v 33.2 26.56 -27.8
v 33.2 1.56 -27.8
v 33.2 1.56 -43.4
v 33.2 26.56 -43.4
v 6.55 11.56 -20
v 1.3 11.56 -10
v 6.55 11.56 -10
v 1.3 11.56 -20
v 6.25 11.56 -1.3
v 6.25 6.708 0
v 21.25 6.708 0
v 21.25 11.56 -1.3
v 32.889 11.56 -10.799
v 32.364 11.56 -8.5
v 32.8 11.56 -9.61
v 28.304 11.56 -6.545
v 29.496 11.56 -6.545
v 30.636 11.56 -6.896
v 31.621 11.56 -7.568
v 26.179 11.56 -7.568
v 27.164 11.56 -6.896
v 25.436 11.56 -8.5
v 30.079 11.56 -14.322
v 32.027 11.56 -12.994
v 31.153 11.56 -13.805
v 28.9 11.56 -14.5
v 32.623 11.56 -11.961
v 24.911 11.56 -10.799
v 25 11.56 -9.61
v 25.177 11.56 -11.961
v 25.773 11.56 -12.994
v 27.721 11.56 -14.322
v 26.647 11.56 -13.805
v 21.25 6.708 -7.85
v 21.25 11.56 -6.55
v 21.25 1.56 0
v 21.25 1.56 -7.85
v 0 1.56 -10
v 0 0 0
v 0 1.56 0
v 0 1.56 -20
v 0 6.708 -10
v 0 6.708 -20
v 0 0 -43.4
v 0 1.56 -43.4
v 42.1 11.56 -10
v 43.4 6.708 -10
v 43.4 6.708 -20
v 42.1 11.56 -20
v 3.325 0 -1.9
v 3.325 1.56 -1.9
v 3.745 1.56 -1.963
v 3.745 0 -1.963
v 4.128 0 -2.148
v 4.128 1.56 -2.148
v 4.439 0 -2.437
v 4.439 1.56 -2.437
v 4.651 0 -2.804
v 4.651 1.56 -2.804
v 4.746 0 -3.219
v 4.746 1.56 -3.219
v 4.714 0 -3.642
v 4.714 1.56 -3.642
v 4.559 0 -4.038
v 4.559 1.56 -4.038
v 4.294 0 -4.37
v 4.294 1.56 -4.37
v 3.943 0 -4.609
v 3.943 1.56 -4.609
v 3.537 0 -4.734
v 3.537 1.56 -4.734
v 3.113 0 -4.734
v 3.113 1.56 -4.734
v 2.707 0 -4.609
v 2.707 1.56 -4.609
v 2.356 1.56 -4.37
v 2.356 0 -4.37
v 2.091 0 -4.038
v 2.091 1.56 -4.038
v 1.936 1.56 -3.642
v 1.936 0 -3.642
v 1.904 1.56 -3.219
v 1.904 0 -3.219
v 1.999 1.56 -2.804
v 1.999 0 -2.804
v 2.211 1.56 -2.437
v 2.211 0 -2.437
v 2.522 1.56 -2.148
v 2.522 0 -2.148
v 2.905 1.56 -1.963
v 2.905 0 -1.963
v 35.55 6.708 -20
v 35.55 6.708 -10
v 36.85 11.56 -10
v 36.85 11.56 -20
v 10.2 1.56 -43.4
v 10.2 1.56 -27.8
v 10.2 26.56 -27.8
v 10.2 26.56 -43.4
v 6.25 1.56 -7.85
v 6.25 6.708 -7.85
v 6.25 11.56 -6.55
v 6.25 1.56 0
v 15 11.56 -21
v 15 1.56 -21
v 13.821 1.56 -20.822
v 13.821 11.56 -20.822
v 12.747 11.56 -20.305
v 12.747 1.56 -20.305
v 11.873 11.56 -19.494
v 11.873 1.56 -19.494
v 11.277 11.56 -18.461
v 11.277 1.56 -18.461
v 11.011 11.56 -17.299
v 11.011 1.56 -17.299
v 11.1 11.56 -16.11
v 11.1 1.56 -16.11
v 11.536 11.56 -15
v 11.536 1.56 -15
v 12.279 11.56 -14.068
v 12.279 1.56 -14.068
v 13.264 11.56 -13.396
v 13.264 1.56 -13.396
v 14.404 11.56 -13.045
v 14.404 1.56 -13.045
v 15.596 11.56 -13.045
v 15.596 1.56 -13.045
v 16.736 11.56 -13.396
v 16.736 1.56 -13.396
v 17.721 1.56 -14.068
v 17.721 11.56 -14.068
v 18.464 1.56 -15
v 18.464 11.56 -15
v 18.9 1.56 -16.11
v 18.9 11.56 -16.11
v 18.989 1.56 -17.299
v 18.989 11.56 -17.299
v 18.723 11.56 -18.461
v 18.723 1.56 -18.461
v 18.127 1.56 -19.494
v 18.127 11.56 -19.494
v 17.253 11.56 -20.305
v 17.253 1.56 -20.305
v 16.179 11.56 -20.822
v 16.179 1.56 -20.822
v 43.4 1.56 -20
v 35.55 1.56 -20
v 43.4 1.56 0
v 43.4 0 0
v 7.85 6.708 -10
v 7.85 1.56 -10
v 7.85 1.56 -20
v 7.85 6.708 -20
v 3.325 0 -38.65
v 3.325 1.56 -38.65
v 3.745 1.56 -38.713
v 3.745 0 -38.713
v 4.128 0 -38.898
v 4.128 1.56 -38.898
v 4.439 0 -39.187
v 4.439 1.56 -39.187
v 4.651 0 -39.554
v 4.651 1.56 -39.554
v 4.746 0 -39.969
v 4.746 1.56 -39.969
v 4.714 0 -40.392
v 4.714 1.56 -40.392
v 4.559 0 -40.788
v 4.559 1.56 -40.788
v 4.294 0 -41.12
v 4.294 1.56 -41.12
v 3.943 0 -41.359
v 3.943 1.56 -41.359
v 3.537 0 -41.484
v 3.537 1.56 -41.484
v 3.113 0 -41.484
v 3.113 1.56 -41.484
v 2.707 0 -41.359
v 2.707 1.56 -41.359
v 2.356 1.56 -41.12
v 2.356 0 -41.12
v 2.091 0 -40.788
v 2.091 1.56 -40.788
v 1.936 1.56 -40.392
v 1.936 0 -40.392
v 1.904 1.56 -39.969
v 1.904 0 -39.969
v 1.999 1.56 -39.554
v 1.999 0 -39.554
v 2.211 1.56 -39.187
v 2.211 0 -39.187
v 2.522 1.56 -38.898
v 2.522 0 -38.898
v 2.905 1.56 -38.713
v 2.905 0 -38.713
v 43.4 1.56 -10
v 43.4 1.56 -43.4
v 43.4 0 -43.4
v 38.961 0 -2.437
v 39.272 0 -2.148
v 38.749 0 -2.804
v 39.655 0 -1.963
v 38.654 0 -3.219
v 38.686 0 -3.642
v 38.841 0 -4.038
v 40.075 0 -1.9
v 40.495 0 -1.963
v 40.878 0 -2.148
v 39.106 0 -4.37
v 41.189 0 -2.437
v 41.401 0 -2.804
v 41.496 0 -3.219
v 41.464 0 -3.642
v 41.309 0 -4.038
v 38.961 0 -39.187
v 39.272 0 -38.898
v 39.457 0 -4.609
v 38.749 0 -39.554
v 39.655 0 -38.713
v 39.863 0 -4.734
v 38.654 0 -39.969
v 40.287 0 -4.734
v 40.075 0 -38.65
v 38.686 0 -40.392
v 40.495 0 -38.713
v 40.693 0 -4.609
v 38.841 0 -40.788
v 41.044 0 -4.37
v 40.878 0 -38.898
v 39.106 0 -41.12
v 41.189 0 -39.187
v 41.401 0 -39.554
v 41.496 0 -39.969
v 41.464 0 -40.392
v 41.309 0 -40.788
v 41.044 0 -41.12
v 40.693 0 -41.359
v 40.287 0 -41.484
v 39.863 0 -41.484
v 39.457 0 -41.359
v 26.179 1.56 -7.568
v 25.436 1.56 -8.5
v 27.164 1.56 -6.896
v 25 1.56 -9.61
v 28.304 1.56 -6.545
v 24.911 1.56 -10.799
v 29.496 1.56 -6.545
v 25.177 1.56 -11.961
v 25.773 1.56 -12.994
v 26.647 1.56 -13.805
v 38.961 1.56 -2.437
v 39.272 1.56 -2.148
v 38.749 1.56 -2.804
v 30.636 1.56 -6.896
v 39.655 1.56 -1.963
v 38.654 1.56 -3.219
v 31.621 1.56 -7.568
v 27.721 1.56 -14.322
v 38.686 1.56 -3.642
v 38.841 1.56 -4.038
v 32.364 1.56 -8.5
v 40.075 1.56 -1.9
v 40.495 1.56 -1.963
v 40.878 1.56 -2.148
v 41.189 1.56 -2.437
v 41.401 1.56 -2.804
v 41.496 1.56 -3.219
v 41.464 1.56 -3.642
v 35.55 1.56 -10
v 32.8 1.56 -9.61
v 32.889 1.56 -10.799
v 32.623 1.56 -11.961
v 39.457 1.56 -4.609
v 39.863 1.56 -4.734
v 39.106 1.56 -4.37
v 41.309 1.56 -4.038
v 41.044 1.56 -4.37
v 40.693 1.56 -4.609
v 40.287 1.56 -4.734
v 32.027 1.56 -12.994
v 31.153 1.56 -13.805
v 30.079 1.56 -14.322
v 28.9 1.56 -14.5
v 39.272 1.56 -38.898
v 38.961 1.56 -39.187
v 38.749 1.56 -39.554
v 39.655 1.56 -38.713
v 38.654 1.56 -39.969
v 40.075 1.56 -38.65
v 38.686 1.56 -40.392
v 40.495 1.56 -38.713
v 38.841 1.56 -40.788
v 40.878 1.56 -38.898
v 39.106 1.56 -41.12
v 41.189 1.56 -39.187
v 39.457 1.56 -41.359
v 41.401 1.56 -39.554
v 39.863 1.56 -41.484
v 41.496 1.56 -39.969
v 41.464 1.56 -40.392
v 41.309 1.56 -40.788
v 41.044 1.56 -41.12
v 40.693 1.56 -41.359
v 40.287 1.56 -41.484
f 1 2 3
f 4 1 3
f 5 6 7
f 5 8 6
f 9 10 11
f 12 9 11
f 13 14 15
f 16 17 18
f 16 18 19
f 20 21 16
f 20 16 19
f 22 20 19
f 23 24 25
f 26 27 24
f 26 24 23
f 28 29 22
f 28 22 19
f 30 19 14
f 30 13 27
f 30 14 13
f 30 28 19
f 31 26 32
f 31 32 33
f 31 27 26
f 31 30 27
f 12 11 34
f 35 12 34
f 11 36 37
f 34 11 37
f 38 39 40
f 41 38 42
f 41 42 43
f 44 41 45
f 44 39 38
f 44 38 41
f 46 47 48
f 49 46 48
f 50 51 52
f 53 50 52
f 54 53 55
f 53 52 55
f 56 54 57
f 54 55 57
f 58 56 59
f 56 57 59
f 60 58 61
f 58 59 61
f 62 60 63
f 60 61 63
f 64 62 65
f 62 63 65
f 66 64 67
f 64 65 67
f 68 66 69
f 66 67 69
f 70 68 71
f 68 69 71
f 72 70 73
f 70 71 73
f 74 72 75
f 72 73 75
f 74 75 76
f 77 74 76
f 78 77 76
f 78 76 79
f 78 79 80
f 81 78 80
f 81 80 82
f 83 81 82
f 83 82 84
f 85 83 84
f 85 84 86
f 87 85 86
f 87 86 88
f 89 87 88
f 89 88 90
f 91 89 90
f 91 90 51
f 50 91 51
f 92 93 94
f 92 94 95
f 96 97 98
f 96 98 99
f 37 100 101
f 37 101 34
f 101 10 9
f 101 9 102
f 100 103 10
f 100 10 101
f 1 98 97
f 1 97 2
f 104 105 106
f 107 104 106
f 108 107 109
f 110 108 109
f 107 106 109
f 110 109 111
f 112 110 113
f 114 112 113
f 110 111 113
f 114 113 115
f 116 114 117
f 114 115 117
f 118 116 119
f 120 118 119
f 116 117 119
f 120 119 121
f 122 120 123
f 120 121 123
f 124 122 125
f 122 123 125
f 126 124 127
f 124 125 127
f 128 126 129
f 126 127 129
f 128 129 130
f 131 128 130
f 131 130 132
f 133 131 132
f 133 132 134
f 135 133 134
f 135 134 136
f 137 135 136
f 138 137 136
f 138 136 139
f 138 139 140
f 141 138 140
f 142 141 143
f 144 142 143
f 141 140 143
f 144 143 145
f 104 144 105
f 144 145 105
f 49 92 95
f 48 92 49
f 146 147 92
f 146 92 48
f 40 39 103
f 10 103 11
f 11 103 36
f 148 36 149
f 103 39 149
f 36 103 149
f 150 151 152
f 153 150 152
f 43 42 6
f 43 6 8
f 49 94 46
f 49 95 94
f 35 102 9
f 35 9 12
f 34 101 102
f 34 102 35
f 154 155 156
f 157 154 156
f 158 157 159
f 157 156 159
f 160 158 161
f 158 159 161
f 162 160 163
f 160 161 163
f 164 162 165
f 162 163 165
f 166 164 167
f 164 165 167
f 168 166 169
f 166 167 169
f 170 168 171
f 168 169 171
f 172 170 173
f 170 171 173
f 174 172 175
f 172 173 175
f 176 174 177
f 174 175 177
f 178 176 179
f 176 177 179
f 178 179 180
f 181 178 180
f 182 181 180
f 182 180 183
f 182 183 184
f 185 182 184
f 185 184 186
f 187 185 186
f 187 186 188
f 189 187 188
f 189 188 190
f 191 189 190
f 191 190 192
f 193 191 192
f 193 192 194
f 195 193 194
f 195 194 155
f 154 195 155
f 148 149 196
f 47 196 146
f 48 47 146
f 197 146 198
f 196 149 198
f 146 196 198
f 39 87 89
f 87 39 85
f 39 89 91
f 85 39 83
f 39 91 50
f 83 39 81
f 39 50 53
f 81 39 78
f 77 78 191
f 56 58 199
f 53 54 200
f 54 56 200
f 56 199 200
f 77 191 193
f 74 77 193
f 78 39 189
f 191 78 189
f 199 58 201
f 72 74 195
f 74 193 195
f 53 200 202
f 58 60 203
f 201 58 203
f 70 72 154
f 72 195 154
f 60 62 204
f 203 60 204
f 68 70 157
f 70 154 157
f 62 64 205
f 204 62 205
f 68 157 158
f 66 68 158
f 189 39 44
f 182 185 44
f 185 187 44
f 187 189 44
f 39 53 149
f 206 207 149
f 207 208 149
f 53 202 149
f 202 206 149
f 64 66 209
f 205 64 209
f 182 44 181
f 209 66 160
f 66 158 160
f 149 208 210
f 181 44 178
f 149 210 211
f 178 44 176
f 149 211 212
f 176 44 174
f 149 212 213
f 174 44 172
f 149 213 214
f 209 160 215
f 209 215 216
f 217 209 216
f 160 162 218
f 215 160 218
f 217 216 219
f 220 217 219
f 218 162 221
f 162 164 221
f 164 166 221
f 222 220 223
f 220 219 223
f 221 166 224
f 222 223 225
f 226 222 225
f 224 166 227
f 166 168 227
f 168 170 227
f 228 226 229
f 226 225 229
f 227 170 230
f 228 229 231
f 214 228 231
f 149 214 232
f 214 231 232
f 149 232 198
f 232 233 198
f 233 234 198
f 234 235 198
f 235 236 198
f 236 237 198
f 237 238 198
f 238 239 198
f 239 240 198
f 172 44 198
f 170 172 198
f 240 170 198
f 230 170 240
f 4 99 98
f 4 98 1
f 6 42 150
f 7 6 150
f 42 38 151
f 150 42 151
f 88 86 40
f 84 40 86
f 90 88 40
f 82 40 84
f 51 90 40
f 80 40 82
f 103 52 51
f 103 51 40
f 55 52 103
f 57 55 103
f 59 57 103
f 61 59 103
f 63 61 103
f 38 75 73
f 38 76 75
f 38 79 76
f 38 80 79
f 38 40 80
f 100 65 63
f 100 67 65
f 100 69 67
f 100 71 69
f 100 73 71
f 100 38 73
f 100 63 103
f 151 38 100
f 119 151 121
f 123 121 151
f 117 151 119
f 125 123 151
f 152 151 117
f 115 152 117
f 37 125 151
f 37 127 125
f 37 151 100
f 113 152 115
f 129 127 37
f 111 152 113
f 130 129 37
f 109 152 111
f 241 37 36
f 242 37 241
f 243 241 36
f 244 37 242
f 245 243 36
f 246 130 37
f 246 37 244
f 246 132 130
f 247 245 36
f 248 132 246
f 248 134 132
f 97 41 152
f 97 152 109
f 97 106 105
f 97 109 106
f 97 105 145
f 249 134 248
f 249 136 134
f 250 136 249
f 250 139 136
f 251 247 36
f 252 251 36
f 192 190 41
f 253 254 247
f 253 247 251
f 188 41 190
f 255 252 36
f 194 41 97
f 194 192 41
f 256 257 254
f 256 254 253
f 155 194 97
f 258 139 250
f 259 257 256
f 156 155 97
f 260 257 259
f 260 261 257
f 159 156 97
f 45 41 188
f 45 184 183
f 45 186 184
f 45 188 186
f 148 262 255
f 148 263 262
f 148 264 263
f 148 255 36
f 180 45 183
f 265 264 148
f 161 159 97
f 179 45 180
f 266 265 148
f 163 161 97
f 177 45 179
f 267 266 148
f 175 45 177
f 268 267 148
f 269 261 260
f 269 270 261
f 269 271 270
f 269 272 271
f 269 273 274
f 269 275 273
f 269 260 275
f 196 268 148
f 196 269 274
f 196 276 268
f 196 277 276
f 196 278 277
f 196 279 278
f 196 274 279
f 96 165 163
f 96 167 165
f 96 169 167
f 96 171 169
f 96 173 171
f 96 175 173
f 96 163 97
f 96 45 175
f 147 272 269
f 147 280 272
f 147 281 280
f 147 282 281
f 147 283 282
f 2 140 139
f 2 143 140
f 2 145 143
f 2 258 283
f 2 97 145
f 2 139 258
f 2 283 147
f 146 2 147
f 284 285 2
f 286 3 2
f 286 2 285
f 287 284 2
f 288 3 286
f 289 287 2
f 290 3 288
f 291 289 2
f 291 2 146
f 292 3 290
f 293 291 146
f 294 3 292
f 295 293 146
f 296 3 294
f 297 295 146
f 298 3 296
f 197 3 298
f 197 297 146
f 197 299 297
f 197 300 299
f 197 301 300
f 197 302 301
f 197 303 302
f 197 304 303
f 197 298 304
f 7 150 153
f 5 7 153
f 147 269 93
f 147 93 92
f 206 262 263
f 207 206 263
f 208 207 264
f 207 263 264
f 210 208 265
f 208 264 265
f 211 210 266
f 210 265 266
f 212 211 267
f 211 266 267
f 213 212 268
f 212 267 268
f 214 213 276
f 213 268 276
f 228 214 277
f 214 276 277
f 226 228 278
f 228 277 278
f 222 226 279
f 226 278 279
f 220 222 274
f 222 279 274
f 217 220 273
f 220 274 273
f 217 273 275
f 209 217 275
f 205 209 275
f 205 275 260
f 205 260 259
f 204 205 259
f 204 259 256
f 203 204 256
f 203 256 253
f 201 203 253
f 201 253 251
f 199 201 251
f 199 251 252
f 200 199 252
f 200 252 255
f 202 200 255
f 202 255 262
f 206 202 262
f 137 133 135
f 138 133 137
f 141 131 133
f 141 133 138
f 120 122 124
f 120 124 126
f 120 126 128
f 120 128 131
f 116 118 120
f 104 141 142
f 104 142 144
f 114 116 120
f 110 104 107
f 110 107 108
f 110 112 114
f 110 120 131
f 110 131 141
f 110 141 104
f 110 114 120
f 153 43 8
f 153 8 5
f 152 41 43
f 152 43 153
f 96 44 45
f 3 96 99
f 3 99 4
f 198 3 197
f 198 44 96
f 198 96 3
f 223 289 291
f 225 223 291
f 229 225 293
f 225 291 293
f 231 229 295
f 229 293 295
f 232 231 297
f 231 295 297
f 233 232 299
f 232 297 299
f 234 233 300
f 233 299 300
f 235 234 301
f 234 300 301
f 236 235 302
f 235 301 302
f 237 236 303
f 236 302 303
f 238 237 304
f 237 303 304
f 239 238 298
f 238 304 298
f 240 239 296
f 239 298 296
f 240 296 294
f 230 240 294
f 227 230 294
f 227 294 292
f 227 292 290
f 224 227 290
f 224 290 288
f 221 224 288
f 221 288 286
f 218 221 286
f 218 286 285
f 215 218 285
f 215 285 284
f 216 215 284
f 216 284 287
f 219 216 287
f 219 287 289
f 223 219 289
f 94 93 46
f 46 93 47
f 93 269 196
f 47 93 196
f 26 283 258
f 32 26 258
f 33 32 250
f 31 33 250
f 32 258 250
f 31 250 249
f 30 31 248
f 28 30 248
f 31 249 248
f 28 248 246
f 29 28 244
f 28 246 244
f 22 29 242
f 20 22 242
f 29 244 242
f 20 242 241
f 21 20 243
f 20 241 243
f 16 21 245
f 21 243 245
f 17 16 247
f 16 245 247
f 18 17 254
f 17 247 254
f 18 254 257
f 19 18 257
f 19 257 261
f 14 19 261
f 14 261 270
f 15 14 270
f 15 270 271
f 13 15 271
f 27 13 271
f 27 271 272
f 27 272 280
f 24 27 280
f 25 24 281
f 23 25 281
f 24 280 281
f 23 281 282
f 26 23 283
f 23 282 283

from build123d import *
from OCP.BRepFilletAPI import BRepFilletAPI_MakeChamfer

# Parameters (mm, degrees)
SKETCH2_W           = 43.4
SKETCH2_H           = 43.4
BOSS_EXTRUDE1_DEPTH = 1.56
SKETCH3_W           = 23
SKETCH3_H           = 15.6
BOSS_EXTRUDE2_DEPTH = 25
SKETCH3_3_R         = 4
SKETCH3_3_W         = 7.85
SKETCH3_3_H         = 10
SKETCH3_3_W_2       = 15
SKETCH3_3_H_2       = 7.85
SKETCH3_3_W_3       = 23
SKETCH3_3_H_3       = 15.6
BOSS_EXTRUDE3_DEPTH = 10
CHAMFER1_SIZE       = 1.3
CHAMFER1_SIZE2      = 4.85166605
SKETCH3_4_R         = 1.425
CUT_EXTRUDE1_DEPTH  = 67.273071454


with BuildPart() as part:
    # Sketch2 → Boss-Extrude1 (new body)
    with BuildSketch(Plane(origin=(0, 0, 0), x_dir=(1, 0, 0), z_dir=(0, 1, 0))):
        with Locations((21.7, 21.7)):
            Rectangle(SKETCH2_W, SKETCH2_H)
    extrude(amount=BOSS_EXTRUDE1_DEPTH)

    # Sketch3 → Boss-Extrude2 (add)
    with BuildSketch(Plane(origin=(0, 1.56, 0), x_dir=(1, 0, 0), z_dir=(0, 1, 0))):
        with Locations((21.7, 35.6)):
            Rectangle(SKETCH3_W, SKETCH3_H)
    extrude(amount=BOSS_EXTRUDE2_DEPTH)

    # Sketch3<3> → Boss-Extrude3 (add)
    with BuildSketch(Plane(origin=(0, 1.56, 0), x_dir=(1, 0, 0), z_dir=(0, 1, 0))):
        with Locations(Location((15, 17, 0), (0, 0, 90))):
            Circle(SKETCH3_3_R)
        with Locations((3.925, 15)):
            Rectangle(SKETCH3_3_W, SKETCH3_3_H)
        with Locations((13.75, 3.925)):
            Rectangle(SKETCH3_3_W_2, SKETCH3_3_H_2)
        with Locations(Location((28.9, 10.5, 0), (0, 0, 90))):
            Circle(SKETCH3_3_R)
        with Locations((39.475, 15)):
            Rectangle(SKETCH3_3_W, SKETCH3_3_H)
        with Locations((21.7, 35.6)):
            Rectangle(SKETCH3_3_W_3, SKETCH3_3_H_3)
    extrude(amount=BOSS_EXTRUDE3_DEPTH)

    # Chamfer1: one chamfer whose edges measure the first distance from different faces: ONE call of the kernel's chamfer builder (chamfer() names one face for all edges)
    chamfer1_edges_1 = [part.edges().sort_by_distance(p)[0] for p in [
        (35.55, 11.56, -15),
        (43.4, 11.56, -15),
    ]]
    chamfer1_side_1 = [part.faces().sort_by_distance(p)[0] for p in [
        (39.475, 11.56, -15),
    ]]
    chamfer1_edges_2 = [part.edges().sort_by_distance(p)[0] for p in [
        (13.75, 11.56, -7.85),
        (13.75, 11.56, 0),
    ]]
    chamfer1_side_2 = [part.faces().sort_by_distance(p)[0] for p in [
        (13.75, 11.56, -3.925),
    ]]
    chamfer1_edges_3 = [part.edges().sort_by_distance(p)[0] for p in [
        (7.85, 11.56, -15),
        (0, 11.56, -15),
    ]]
    chamfer1_side_3 = [part.faces().sort_by_distance(p)[0] for p in [
        (3.925, 11.56, -15),
    ]]
    chamfer1 = BRepFilletAPI_MakeChamfer(part.part.solid().wrapped)
    for e in chamfer1_edges_1:
        chamfer1.Add(CHAMFER1_SIZE, CHAMFER1_SIZE2, e.wrapped, chamfer1_side_1[0].wrapped)  # the first distance lies on this face
    for e in chamfer1_edges_2:
        chamfer1.Add(CHAMFER1_SIZE, CHAMFER1_SIZE2, e.wrapped, chamfer1_side_2[0].wrapped)  # the first distance lies on this face
    for e in chamfer1_edges_3:
        chamfer1.Add(CHAMFER1_SIZE, CHAMFER1_SIZE2, e.wrapped, chamfer1_side_3[0].wrapped)  # the first distance lies on this face
    add(Compound.cast(chamfer1.Shape()), mode=Mode.REPLACE)

    # Sketch3<4> → Cut-Extrude1 (cut, through all)
    with BuildSketch(Plane(origin=(0, 1.56, 0), x_dir=(1, 0, 0), z_dir=(0, 1, 0))):
        with Locations(Location((3.325, 40.075, 0), (0, 0, 270))):
            Circle(SKETCH3_4_R)
        with Locations(Location((40.075, 40.075, 0), (0, 0, 270))):
            Circle(SKETCH3_4_R)
        with Locations(Location((40.075, 3.325, 0), (0, 0, 270))):
            Circle(SKETCH3_4_R)
        with Locations(Location((3.325, 3.325, 0), (0, 0, 270))):
            Circle(SKETCH3_4_R)
    extrude(amount=-CUT_EXTRUDE1_DEPTH, mode=Mode.SUBTRACT)


solid = part.part
